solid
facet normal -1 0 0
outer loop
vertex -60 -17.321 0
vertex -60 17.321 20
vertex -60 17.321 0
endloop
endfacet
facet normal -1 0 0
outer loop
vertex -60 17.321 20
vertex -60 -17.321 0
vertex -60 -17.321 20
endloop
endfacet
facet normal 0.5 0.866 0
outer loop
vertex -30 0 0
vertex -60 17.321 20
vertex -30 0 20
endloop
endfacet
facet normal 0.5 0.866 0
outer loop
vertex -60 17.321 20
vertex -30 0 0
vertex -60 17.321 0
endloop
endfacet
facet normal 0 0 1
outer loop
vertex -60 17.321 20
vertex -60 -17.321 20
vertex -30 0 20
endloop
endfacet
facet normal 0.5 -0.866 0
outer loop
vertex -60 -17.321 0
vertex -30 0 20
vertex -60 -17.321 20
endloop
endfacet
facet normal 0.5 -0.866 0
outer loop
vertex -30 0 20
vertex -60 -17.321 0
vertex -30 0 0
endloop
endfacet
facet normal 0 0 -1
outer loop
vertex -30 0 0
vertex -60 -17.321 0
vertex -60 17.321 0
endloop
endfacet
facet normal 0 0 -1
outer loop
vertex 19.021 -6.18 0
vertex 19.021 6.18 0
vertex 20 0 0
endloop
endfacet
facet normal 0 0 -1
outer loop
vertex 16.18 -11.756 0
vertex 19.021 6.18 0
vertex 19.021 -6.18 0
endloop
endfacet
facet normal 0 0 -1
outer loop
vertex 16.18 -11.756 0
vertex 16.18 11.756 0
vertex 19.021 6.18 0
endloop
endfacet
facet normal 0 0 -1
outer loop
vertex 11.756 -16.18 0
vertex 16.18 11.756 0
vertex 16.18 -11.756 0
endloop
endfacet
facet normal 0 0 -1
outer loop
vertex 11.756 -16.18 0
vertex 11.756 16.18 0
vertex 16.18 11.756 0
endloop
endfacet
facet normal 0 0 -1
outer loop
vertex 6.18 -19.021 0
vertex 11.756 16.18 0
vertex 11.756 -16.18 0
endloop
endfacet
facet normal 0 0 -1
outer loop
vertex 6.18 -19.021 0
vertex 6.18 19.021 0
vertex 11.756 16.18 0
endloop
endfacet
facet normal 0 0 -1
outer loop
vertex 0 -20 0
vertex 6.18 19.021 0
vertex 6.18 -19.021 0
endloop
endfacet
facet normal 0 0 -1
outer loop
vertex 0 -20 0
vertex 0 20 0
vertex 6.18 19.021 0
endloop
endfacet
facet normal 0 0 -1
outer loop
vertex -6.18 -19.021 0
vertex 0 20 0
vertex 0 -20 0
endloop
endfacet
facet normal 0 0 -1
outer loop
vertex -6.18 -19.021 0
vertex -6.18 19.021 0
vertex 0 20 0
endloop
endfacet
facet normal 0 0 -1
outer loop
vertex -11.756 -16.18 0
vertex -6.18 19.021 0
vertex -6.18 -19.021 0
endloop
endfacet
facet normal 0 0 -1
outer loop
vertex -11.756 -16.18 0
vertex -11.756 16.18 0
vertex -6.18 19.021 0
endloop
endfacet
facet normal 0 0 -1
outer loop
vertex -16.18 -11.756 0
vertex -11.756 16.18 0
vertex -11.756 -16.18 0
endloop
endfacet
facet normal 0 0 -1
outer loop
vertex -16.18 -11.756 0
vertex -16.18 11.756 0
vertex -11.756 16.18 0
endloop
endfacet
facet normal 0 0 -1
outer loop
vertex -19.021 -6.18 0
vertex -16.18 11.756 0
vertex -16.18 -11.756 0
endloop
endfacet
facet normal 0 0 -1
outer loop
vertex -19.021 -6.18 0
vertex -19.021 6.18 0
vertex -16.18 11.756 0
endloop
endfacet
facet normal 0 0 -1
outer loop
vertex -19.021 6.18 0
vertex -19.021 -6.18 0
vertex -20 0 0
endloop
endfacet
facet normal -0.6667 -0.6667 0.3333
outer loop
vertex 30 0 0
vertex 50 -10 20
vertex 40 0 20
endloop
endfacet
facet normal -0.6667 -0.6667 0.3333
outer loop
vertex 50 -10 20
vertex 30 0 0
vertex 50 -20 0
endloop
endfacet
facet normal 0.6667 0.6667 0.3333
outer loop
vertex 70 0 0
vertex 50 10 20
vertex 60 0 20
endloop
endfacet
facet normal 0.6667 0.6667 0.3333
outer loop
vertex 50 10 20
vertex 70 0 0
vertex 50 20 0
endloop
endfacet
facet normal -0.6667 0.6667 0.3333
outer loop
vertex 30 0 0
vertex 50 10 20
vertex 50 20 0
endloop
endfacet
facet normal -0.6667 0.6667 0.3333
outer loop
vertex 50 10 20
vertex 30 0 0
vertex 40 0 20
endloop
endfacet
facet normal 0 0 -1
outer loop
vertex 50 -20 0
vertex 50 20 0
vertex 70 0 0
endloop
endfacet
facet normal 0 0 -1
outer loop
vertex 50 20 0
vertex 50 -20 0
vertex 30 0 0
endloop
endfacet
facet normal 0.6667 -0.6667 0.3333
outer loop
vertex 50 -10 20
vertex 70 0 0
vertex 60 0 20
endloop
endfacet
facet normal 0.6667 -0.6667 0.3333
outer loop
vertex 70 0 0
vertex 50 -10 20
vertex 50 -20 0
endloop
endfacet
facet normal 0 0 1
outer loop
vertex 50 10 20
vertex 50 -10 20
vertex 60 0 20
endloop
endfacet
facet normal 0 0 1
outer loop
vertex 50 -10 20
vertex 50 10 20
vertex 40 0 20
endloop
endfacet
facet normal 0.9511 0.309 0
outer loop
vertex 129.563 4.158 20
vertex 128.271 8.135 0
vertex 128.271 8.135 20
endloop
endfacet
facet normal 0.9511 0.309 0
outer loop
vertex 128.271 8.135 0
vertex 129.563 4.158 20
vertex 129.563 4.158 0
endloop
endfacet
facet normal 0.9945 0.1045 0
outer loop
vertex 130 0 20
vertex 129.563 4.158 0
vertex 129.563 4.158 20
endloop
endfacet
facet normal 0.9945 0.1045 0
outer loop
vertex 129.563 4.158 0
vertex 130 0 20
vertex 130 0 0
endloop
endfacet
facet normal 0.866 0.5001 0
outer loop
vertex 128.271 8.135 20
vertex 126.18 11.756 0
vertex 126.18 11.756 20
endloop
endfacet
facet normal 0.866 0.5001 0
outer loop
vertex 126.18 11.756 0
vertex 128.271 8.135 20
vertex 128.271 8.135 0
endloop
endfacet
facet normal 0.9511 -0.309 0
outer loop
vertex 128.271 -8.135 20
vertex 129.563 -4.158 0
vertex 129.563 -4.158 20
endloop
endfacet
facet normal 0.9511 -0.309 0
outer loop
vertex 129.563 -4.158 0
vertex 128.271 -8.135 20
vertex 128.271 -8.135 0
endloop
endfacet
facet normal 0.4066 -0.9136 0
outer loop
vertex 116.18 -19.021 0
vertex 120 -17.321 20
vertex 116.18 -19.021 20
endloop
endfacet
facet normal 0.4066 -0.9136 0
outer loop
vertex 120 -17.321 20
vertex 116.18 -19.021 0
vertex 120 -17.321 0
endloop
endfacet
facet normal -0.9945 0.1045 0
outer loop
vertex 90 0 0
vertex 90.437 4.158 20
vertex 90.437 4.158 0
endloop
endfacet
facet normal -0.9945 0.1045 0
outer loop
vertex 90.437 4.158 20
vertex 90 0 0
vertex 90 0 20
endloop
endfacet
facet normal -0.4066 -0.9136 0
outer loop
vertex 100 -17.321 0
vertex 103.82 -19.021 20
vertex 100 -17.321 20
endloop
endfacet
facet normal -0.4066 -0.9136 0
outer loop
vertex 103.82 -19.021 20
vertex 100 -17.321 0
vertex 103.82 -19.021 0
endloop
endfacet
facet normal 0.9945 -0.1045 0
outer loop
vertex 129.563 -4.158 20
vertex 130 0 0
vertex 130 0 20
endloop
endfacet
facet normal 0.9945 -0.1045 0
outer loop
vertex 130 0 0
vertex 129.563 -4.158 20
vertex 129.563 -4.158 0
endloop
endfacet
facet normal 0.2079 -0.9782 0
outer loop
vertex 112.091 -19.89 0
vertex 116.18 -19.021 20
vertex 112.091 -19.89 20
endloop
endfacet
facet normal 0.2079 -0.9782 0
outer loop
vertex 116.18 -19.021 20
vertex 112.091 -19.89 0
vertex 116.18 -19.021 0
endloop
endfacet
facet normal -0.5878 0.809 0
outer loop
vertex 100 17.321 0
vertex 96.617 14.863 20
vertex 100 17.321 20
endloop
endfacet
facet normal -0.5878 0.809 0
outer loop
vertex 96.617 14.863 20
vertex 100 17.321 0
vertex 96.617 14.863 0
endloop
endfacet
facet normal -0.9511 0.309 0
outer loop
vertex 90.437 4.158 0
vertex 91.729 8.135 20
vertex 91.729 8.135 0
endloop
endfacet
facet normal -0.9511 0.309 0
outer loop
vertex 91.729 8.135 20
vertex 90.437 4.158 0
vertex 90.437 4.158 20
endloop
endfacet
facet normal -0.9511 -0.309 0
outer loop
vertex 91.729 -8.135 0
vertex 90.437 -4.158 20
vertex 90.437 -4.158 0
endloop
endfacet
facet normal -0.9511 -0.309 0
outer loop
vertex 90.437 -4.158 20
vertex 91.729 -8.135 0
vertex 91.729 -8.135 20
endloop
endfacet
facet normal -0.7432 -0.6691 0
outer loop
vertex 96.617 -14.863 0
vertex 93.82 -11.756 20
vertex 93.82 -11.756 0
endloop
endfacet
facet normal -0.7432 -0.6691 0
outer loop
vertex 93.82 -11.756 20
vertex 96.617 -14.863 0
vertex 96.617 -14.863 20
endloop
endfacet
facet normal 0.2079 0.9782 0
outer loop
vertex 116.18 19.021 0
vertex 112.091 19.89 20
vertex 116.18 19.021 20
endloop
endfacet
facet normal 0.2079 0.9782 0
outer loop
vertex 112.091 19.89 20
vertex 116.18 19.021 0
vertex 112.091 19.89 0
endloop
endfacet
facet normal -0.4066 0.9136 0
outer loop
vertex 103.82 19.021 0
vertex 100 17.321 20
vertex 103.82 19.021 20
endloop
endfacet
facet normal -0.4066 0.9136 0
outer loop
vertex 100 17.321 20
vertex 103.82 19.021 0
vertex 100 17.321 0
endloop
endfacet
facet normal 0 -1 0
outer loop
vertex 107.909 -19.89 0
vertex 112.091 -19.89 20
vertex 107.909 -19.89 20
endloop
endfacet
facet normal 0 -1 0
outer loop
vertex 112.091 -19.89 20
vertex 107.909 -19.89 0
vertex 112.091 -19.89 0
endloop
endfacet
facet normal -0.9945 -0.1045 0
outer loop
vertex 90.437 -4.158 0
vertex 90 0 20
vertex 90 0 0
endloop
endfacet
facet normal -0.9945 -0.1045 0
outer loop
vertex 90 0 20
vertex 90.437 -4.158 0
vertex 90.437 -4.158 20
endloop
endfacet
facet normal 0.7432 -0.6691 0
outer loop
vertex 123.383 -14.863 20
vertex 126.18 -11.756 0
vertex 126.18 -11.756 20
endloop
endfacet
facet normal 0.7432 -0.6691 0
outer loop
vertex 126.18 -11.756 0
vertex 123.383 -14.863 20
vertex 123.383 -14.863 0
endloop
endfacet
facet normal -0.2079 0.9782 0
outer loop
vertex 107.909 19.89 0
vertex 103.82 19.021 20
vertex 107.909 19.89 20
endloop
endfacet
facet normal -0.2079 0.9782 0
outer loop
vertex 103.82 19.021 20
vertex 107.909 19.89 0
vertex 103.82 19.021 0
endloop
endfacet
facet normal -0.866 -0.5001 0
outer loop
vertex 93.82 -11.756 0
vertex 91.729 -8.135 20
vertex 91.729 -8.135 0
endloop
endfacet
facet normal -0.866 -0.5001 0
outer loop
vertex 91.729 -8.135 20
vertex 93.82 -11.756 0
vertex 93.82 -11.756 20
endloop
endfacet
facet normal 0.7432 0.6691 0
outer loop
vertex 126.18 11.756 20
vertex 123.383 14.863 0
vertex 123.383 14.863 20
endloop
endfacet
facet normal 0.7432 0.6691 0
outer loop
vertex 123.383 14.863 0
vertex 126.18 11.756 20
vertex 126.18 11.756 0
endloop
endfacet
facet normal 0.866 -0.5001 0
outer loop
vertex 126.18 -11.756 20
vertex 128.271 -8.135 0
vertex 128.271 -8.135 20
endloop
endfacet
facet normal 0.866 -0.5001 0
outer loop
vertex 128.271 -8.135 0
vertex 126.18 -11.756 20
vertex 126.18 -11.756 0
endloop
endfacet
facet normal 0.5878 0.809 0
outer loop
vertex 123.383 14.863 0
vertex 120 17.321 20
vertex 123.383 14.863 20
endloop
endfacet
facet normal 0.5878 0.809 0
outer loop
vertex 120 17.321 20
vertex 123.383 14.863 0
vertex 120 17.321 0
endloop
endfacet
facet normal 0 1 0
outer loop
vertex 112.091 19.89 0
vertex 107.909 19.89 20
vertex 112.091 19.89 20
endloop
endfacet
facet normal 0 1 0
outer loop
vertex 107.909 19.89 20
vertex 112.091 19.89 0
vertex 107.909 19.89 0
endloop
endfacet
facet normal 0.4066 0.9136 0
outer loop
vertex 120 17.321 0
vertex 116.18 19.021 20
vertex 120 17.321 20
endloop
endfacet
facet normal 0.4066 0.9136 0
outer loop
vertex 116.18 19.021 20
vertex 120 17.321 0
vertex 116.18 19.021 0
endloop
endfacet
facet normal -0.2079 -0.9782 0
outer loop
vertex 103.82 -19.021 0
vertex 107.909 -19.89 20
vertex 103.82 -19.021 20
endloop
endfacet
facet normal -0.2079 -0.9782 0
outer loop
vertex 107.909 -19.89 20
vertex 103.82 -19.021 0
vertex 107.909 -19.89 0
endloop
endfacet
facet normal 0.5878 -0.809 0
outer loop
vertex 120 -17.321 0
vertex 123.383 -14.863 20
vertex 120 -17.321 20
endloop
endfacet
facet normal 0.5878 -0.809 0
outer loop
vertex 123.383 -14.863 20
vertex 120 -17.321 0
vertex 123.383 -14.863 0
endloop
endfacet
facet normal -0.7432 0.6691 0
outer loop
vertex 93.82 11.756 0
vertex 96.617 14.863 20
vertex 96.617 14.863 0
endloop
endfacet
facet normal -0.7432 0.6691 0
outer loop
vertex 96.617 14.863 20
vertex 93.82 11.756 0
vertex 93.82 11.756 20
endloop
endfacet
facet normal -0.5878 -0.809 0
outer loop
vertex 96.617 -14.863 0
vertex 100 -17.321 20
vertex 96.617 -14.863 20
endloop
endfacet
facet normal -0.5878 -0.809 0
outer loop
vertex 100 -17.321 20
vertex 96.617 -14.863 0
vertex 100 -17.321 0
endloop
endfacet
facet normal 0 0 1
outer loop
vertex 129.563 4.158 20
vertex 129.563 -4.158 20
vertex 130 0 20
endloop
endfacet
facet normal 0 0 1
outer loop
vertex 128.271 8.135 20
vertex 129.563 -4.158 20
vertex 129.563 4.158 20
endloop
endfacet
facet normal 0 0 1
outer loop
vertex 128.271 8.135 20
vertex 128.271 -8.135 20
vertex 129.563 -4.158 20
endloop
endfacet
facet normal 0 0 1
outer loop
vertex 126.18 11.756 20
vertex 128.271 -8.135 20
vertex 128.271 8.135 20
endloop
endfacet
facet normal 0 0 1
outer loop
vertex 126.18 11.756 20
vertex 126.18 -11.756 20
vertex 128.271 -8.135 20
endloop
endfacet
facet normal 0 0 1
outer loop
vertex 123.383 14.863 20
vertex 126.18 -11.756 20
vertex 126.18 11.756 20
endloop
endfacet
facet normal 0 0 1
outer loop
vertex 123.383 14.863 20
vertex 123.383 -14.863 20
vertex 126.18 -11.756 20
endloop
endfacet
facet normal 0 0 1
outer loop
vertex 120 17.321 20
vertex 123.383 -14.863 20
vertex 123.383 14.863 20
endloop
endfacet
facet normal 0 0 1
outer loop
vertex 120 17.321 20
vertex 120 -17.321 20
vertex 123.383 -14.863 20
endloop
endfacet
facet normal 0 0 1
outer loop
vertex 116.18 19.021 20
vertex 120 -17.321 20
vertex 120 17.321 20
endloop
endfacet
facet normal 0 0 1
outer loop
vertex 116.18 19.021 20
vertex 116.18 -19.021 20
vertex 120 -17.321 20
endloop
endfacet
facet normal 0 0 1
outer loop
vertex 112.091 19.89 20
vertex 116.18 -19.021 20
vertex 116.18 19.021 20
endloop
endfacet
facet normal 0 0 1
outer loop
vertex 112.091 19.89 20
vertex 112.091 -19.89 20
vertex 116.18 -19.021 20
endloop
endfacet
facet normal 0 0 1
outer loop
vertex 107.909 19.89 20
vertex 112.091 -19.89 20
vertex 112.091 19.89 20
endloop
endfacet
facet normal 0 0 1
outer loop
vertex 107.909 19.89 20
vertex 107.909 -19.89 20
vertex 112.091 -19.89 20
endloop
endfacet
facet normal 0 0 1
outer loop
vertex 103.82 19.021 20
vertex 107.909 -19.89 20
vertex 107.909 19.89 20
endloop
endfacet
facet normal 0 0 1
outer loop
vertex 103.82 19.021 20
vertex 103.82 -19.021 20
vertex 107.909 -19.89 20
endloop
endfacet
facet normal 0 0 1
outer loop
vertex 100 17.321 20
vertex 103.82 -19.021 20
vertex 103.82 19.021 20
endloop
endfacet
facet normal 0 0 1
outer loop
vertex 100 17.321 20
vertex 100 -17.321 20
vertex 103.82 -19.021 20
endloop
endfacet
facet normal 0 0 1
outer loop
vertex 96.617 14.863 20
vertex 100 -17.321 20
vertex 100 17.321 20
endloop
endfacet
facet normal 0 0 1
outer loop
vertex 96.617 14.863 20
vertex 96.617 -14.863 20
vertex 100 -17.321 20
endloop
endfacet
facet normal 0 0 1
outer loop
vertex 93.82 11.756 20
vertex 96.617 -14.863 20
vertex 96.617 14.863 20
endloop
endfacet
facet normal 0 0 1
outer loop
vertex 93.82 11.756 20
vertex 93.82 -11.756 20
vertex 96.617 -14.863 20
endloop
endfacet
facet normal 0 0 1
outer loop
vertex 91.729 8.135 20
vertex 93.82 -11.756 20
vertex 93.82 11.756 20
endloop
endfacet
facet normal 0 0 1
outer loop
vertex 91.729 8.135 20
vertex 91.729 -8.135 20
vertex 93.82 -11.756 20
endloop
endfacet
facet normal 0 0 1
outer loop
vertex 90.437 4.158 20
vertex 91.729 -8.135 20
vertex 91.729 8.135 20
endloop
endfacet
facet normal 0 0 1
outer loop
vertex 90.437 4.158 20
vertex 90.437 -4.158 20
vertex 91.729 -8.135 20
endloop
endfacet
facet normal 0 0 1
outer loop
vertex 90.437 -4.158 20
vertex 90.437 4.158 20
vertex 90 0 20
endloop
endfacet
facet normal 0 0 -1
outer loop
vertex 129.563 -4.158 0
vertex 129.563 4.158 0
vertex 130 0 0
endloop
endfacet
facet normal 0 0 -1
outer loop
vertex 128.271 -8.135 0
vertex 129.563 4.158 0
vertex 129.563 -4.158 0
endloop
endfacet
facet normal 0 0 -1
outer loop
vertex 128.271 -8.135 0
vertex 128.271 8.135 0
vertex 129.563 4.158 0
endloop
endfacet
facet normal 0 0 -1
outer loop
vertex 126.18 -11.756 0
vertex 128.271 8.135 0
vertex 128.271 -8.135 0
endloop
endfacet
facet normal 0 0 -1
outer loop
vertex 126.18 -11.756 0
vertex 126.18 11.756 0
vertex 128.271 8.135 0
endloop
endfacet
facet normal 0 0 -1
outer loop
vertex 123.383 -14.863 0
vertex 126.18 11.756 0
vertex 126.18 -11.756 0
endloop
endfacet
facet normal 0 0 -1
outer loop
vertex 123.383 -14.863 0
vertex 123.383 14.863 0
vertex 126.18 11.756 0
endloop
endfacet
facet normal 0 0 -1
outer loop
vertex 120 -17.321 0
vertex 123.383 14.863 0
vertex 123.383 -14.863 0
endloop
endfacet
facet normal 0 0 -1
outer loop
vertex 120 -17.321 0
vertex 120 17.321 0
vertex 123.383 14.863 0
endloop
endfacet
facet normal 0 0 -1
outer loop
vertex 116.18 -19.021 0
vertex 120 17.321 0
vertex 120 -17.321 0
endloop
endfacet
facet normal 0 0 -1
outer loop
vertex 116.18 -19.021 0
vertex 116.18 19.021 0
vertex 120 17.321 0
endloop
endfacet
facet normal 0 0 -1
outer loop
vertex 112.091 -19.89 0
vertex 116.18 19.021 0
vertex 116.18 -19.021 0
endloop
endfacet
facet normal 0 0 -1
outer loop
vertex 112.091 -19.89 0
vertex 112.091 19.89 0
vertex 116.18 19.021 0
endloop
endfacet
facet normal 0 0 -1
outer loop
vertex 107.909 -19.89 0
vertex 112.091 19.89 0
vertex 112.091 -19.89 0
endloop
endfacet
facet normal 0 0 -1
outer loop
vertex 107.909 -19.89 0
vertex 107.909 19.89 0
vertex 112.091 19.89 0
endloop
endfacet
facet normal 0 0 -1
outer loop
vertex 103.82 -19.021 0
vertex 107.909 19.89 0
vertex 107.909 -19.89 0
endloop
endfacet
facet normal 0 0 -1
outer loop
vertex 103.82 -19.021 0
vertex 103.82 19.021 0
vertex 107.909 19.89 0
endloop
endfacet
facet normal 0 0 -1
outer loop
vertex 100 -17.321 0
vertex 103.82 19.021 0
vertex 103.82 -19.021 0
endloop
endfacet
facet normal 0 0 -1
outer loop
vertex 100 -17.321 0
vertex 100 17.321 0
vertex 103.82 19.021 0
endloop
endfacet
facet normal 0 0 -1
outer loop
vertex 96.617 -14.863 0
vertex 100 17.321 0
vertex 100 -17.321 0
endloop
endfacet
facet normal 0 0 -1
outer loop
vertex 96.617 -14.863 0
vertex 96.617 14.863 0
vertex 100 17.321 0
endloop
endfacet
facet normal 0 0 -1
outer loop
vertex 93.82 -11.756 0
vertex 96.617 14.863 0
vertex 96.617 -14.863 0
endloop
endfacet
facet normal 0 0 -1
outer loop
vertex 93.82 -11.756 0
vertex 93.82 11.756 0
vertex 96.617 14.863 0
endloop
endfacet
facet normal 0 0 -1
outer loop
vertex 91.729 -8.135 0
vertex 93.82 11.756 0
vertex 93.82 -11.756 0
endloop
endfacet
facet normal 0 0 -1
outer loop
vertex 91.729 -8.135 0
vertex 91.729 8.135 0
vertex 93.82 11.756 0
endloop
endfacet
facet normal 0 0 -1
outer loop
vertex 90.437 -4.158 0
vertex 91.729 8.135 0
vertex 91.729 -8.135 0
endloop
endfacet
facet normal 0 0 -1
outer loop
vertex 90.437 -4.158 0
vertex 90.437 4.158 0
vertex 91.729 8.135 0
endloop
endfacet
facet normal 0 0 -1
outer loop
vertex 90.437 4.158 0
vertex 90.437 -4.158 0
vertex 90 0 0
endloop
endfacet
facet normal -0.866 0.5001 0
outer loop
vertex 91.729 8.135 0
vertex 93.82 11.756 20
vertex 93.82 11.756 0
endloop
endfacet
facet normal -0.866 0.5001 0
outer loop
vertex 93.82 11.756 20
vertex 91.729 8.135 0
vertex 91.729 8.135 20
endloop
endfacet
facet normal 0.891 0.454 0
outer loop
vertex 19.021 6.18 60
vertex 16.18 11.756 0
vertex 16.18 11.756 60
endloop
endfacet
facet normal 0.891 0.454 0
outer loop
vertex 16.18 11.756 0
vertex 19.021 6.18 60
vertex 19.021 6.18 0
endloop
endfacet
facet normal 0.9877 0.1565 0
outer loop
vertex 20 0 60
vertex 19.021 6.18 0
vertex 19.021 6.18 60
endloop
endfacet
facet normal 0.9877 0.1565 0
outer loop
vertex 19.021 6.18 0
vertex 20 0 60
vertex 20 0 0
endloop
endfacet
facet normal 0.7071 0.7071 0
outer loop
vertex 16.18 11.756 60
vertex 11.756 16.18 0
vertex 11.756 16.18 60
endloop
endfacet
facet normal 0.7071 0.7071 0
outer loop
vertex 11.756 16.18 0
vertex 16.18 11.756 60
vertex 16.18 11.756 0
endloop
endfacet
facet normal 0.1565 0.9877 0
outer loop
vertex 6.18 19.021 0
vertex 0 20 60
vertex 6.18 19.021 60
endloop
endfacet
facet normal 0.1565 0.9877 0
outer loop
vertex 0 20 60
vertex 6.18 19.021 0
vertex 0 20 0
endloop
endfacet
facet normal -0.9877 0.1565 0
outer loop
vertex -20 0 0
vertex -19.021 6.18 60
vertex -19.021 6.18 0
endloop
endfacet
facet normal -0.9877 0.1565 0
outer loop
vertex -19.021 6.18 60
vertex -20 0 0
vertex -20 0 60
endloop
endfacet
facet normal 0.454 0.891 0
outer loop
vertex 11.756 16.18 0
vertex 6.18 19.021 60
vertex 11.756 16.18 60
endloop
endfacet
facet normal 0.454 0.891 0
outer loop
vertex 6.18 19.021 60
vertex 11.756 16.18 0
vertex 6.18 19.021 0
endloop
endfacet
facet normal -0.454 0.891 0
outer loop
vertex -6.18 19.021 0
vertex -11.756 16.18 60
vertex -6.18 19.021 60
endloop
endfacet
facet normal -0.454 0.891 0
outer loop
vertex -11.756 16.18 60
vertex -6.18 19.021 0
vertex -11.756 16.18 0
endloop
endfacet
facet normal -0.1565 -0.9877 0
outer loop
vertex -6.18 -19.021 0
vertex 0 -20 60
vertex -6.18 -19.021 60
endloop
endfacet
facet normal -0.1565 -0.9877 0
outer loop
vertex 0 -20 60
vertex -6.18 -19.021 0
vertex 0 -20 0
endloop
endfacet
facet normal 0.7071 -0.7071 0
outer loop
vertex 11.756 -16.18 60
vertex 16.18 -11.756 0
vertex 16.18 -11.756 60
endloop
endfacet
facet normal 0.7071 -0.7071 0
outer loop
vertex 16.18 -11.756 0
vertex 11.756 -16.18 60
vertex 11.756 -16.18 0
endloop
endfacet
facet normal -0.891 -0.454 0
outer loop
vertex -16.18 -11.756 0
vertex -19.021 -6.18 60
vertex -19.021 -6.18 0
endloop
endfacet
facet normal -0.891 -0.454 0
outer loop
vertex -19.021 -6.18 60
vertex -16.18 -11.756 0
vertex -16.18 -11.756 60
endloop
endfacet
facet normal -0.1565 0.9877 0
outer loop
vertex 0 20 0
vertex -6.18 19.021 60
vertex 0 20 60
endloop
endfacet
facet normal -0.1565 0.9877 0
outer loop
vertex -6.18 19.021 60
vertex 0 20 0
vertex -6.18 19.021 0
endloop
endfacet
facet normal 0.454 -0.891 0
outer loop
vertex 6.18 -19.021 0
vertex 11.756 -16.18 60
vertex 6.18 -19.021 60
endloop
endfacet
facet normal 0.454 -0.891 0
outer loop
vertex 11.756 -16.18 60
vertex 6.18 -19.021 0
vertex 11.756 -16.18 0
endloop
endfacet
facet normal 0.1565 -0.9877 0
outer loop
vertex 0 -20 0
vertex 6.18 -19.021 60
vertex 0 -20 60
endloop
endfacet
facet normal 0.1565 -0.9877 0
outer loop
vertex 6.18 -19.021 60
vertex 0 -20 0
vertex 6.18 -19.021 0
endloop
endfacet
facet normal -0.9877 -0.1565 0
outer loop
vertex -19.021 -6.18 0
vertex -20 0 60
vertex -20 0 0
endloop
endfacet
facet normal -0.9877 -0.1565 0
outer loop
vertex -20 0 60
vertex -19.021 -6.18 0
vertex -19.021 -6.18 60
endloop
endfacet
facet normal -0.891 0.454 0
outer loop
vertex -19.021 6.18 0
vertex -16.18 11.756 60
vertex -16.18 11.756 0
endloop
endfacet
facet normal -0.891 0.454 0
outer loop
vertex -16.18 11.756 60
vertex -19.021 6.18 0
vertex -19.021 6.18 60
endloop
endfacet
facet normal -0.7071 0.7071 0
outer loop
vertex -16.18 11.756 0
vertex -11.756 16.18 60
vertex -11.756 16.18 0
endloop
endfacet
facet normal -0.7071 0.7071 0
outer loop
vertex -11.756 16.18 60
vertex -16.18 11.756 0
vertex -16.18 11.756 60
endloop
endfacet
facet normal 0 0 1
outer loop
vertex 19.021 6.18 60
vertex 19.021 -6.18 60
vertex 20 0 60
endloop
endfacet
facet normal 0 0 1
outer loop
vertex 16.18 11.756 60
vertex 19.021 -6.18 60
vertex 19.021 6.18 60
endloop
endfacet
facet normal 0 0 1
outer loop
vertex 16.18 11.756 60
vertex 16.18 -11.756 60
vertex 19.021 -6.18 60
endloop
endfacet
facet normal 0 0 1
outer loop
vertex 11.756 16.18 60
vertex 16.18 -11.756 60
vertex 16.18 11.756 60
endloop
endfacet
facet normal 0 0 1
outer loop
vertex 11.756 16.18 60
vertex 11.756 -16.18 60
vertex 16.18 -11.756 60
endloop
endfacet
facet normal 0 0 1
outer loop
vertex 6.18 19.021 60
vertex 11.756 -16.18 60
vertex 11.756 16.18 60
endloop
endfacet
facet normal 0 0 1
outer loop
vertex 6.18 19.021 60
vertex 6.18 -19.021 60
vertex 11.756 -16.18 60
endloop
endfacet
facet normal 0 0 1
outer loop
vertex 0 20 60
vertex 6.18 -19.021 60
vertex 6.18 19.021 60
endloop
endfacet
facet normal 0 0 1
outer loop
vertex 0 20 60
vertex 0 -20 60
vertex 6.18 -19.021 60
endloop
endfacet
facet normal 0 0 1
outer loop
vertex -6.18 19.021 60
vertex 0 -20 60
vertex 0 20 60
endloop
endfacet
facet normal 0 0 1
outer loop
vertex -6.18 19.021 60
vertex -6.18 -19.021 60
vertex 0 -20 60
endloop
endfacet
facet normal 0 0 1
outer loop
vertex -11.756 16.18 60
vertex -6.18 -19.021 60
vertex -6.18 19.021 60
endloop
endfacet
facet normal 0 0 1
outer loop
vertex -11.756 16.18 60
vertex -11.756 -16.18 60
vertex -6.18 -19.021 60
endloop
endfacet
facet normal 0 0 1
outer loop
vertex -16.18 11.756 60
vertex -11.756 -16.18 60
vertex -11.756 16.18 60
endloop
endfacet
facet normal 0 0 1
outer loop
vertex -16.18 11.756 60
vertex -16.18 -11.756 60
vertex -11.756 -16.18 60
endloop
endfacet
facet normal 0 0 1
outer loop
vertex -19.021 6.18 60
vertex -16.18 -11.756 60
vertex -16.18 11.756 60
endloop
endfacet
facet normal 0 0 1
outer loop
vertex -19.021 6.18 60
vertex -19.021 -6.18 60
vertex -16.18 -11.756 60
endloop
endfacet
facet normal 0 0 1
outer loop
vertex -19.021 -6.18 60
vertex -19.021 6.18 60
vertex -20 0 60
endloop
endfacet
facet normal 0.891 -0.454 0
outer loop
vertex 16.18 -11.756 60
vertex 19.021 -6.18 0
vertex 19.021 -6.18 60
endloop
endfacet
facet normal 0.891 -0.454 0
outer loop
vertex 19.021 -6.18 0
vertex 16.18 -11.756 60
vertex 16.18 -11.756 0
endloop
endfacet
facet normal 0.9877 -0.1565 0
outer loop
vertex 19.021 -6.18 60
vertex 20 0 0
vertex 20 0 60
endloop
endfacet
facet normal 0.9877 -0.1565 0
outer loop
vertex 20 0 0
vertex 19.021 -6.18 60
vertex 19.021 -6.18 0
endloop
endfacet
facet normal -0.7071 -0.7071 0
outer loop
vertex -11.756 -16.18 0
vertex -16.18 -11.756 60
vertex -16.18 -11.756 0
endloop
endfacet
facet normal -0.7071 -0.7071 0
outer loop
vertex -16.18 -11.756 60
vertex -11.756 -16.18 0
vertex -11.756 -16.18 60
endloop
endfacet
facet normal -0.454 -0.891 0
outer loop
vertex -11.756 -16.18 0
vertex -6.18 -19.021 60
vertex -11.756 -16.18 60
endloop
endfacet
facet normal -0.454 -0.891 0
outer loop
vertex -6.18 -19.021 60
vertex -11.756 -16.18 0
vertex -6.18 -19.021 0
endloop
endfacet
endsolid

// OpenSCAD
// originally from https://en.wikibooks.org/wiki/OpenSCAD_User_Manual/Primitive_Solids#cylinder

translate([-50, 0, 0])
cylinder(20,20,20, $fn=3);

color("brown")
cylinder(20,20,00, $fn=4);

color("green")
translate([50, 0, 0])
cylinder(20,20,10, $fn=4);

color("green")
translate([110, 0, 0])
cylinder(20,20,20, $fn=30);

color("red")
cylinder(r=20, h = 60, $fn=20);
